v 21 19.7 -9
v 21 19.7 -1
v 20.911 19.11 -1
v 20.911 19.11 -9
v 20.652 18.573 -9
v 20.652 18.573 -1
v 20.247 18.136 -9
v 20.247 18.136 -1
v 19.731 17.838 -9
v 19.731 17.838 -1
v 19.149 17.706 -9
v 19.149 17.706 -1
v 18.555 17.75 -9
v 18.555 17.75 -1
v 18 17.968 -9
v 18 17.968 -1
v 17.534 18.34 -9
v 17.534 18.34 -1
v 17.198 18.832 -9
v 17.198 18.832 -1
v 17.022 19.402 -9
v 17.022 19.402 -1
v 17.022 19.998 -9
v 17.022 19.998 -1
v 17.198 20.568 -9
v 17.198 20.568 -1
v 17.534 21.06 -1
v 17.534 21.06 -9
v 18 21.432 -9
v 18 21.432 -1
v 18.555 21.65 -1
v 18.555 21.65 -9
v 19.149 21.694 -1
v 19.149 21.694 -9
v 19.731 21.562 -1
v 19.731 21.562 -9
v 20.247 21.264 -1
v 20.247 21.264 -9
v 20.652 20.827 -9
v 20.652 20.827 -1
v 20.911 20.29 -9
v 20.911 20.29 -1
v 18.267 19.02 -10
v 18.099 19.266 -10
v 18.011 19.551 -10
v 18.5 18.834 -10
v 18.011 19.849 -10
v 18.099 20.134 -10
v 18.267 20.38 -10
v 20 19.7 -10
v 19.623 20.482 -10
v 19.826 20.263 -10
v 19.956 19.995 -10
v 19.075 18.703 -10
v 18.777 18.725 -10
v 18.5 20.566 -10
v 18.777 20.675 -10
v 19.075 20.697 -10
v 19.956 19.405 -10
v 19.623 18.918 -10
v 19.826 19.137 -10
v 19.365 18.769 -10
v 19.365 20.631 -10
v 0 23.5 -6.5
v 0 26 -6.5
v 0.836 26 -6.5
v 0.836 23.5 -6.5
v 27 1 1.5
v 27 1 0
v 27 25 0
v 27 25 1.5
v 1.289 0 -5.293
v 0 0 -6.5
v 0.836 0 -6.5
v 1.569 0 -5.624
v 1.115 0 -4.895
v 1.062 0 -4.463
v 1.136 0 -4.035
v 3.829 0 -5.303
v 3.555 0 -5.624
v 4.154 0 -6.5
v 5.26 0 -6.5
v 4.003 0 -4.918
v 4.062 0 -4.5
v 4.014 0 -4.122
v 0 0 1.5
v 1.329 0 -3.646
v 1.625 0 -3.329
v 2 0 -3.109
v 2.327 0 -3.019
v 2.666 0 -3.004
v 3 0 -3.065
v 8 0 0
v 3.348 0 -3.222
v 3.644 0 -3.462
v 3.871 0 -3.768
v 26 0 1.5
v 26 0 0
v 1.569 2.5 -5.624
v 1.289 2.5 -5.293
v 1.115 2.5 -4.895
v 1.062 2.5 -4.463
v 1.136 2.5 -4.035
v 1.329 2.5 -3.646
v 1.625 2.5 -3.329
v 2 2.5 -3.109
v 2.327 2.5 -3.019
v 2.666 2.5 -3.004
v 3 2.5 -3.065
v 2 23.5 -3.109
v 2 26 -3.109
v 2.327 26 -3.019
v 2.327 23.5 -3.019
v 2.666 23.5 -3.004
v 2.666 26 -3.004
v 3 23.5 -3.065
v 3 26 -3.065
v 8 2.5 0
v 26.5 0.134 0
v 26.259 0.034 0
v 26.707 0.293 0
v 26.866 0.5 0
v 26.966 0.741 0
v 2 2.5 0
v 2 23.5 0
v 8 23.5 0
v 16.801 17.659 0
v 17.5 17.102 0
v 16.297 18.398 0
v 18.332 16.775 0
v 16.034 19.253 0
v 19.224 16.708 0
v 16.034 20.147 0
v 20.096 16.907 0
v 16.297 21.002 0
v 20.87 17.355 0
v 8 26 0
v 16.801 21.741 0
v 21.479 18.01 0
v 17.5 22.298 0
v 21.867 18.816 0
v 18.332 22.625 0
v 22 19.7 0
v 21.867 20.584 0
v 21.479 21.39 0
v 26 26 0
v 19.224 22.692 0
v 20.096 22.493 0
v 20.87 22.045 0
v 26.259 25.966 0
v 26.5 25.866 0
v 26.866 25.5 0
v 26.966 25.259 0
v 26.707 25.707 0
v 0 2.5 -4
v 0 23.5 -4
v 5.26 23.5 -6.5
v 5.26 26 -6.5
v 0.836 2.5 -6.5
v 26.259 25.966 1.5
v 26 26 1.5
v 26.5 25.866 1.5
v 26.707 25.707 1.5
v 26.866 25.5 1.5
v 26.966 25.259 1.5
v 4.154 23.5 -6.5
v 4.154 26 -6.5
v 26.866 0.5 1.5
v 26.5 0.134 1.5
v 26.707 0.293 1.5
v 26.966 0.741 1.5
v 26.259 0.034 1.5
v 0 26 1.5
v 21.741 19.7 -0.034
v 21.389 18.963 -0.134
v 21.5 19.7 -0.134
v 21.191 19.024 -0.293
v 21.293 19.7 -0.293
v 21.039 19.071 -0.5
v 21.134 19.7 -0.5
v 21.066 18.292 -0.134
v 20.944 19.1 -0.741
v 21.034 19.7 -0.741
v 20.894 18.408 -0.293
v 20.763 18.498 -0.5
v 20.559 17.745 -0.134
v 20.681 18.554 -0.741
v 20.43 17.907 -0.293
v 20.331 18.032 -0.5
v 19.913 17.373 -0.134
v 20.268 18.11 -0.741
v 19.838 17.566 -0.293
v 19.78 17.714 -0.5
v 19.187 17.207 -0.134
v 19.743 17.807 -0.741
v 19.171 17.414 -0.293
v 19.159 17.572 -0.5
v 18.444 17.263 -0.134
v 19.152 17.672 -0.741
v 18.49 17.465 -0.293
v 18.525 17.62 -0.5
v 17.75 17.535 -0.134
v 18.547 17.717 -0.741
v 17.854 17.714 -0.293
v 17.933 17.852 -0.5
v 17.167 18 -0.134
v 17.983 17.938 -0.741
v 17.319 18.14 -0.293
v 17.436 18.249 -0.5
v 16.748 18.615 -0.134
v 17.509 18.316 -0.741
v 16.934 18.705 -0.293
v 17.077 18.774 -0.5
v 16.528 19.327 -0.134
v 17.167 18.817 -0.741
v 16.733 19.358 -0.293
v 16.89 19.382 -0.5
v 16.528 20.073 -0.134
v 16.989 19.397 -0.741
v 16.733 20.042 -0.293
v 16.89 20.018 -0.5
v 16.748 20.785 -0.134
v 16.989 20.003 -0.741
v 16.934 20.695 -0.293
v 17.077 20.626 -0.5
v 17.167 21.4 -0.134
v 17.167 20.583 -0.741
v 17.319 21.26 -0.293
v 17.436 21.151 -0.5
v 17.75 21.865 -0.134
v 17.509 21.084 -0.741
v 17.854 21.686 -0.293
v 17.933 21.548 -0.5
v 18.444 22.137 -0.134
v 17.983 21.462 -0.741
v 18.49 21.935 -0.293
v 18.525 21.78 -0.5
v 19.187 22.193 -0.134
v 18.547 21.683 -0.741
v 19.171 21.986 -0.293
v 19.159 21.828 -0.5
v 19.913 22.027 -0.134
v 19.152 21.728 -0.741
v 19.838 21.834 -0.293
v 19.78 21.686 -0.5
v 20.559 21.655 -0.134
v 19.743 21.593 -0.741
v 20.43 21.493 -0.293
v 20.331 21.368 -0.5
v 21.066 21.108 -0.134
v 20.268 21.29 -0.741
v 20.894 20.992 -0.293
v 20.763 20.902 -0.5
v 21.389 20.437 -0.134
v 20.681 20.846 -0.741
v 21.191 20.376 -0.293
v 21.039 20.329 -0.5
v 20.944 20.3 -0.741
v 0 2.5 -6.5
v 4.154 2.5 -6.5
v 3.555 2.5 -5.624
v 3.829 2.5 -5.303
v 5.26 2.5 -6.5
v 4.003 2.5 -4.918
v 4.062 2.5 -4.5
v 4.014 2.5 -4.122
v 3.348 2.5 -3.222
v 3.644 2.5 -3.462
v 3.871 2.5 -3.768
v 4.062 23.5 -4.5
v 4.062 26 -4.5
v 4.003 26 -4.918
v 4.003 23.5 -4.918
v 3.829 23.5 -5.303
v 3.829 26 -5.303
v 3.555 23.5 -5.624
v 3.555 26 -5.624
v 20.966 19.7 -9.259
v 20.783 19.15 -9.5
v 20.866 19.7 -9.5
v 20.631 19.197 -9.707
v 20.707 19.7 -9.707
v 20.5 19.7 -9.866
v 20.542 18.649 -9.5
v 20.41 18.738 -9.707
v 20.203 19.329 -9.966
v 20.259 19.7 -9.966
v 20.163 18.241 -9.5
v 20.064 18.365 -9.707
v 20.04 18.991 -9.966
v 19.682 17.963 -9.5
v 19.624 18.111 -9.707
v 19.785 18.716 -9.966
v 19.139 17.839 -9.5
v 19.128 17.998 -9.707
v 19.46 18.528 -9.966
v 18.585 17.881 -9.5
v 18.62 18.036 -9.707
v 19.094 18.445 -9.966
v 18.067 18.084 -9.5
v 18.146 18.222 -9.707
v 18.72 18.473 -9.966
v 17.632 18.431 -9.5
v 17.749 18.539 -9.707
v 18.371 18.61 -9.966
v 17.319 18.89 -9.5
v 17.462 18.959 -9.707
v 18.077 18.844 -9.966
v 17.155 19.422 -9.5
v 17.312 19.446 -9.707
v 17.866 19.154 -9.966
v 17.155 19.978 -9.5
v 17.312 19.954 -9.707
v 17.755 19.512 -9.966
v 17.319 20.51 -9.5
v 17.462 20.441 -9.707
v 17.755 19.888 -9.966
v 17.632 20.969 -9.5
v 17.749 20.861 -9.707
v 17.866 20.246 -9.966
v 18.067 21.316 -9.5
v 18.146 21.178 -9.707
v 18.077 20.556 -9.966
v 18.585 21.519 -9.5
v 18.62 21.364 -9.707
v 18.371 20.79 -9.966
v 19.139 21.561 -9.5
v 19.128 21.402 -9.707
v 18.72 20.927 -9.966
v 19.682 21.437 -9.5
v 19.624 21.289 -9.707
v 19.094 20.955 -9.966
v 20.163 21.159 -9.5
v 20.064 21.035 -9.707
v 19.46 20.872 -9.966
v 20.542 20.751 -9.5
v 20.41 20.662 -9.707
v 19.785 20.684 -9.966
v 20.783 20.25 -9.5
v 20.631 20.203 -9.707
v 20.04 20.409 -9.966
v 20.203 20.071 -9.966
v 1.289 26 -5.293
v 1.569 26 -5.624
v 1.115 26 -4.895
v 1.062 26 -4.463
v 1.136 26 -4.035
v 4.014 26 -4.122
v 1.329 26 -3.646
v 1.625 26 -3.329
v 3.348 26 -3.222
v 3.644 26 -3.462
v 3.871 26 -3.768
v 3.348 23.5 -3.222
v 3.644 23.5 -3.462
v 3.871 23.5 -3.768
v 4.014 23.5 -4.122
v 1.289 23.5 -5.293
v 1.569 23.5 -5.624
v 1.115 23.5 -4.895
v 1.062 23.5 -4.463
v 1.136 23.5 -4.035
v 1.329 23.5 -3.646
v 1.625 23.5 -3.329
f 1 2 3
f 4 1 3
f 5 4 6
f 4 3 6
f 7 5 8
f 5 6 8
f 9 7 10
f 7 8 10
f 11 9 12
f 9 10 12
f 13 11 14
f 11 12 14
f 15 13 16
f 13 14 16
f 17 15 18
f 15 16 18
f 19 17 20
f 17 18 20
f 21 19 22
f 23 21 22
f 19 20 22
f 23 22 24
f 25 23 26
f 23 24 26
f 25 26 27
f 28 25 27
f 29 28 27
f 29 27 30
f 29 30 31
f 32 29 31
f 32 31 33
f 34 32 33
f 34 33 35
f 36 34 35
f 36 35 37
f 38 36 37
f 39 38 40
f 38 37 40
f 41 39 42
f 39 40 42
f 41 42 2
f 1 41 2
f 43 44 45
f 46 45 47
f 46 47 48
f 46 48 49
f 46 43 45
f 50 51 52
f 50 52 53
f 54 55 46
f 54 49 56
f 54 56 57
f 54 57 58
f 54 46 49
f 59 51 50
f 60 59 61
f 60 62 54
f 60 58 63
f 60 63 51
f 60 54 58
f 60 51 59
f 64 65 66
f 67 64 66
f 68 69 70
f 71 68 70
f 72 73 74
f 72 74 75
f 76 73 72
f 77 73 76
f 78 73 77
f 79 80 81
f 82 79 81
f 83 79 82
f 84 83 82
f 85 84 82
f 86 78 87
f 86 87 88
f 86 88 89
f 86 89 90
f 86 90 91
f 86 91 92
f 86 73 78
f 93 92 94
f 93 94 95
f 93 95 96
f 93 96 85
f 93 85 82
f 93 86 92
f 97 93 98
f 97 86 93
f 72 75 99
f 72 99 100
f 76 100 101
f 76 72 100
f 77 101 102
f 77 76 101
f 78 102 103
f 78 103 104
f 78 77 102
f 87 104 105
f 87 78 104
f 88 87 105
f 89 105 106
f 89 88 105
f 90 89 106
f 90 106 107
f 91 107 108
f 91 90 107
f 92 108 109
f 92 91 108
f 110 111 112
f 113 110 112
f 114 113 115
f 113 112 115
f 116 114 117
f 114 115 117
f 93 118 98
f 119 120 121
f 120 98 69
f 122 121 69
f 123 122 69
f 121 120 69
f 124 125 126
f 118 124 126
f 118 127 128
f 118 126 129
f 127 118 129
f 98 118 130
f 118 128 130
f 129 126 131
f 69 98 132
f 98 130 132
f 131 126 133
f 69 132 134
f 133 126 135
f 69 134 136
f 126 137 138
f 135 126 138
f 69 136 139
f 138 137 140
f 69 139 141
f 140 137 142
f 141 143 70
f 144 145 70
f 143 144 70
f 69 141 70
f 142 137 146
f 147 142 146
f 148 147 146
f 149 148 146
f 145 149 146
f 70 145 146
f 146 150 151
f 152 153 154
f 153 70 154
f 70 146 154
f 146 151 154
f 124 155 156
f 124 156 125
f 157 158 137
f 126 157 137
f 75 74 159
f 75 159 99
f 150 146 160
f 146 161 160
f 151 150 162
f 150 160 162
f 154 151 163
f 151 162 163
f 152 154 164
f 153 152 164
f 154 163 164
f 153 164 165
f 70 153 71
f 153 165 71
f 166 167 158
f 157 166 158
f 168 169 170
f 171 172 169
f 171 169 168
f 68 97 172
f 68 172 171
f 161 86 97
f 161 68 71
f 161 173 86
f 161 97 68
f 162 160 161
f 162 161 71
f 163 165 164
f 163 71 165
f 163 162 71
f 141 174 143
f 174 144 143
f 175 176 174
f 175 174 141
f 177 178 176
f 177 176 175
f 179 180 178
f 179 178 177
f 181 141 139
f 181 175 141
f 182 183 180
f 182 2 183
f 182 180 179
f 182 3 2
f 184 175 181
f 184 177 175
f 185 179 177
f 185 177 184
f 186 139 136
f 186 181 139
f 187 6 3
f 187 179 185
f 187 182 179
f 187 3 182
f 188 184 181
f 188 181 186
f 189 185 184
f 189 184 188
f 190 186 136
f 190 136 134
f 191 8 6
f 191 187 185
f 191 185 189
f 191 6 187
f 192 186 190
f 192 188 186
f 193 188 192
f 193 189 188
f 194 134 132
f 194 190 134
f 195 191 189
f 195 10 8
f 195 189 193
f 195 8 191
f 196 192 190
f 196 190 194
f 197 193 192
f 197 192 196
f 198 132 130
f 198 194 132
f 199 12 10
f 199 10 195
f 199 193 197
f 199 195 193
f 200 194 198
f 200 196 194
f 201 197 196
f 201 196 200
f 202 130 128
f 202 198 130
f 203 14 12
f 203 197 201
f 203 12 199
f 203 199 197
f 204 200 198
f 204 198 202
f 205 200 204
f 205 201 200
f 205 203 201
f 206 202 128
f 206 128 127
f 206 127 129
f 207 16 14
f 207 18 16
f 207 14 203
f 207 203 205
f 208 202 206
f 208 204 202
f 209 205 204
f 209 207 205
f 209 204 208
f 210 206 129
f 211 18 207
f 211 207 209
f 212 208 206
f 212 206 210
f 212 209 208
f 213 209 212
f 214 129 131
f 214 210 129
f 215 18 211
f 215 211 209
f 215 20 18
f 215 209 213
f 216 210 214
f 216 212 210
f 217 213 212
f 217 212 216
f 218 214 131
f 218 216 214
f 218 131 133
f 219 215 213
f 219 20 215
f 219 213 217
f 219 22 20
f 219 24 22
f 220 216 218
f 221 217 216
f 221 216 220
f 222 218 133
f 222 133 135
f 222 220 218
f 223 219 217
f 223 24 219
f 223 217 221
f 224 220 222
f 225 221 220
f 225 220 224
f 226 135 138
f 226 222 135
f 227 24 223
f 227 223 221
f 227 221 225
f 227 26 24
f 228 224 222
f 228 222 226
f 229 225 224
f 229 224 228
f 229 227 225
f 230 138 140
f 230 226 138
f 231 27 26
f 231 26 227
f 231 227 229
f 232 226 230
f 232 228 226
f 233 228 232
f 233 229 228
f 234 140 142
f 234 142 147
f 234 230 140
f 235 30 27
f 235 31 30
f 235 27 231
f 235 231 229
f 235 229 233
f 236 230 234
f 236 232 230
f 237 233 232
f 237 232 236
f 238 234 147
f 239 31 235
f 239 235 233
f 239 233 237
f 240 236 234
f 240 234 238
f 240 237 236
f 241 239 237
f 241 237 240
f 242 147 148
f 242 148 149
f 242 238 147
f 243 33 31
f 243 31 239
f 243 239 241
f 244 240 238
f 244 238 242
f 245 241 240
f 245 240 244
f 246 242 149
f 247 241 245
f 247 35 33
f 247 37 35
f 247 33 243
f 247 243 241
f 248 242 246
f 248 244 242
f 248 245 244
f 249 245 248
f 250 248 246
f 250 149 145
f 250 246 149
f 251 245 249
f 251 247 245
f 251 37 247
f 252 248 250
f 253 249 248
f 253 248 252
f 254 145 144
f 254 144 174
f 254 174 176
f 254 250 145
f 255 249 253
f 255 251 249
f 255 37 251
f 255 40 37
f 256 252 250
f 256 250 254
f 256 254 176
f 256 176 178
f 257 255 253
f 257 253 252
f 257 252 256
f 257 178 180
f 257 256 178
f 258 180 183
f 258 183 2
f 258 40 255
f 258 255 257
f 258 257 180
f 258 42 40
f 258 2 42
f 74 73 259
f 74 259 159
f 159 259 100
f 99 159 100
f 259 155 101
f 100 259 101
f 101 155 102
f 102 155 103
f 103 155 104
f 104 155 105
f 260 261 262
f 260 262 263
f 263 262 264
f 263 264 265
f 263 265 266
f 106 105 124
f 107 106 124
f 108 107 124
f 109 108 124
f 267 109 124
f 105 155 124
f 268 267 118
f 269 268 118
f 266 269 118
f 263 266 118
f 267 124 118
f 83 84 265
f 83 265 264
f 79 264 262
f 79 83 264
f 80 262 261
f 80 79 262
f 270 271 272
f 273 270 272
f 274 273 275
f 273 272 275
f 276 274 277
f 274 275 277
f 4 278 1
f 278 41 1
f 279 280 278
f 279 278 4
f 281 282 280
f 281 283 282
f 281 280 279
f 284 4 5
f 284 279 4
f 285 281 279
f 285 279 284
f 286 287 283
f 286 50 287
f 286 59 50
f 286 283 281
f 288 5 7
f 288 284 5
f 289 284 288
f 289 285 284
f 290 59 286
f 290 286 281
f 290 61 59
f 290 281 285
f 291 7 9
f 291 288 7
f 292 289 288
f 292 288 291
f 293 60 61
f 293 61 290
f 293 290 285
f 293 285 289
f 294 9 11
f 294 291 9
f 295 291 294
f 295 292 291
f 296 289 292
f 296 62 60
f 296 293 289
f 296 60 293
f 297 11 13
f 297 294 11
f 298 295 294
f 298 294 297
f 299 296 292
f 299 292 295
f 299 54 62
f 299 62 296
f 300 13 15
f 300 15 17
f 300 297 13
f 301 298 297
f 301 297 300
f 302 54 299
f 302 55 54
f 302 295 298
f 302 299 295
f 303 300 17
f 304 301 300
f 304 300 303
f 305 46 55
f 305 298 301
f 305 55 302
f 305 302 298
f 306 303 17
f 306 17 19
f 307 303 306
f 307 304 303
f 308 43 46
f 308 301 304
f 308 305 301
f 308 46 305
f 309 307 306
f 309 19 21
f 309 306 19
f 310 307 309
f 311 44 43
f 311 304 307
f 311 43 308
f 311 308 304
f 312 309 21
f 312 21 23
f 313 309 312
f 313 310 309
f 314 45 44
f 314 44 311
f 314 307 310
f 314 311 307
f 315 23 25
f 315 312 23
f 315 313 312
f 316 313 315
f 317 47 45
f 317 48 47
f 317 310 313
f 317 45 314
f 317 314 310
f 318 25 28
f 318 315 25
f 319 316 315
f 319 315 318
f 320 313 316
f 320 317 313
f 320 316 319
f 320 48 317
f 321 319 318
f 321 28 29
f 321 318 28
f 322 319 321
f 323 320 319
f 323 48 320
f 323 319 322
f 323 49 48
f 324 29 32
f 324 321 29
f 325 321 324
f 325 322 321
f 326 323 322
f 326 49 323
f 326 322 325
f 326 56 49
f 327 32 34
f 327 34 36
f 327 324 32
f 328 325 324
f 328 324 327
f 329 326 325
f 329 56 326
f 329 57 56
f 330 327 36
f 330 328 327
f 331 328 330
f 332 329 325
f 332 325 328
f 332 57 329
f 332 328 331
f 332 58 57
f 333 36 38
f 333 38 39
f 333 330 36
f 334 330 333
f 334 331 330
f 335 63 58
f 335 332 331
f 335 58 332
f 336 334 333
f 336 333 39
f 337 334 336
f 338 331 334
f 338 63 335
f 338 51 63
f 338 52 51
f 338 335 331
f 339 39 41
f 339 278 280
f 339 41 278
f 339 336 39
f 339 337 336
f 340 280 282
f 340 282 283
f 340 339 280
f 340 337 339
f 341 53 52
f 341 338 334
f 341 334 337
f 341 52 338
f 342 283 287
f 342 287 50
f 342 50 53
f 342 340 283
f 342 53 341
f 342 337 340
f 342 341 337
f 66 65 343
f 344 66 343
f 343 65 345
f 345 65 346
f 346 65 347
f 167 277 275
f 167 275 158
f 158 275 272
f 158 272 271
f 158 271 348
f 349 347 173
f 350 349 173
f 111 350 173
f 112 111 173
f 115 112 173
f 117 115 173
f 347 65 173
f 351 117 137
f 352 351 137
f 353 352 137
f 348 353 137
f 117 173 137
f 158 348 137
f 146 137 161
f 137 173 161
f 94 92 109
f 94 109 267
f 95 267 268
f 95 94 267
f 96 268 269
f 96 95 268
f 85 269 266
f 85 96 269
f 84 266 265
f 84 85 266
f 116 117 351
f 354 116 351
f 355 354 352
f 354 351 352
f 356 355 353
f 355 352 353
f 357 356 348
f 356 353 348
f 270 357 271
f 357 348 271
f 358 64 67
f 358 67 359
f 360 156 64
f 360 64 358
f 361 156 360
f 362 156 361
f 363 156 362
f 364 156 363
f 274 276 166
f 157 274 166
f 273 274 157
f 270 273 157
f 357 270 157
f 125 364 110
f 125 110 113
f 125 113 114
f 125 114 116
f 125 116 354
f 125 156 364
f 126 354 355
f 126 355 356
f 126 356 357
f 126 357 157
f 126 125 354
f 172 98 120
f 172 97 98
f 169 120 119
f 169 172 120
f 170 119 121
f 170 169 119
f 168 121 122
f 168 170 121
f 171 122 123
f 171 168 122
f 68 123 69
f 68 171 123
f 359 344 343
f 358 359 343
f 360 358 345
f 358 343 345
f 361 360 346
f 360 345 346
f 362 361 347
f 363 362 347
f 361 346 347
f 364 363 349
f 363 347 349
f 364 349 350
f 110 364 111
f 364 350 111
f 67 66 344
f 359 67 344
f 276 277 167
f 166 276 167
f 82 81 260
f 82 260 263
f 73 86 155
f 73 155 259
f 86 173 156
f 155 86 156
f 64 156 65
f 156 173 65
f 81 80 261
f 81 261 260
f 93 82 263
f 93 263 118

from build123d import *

# Parameters (mm, degrees)
F0_W     = 27
F0_H     = 26
F1_DEPTH = 1.5
F3_DEPTH = 2.5
F5_DEPTH = 26
F7_R     = 2
F8_DEPTH = 10
F9_R     = 1
F10_R    = 1


# Not quite as in the source:
# - a pattern or mirror of a feature is missing from the dataset's text; its kind, count and spacing are read off the source's solid


with BuildPart() as f1:
    # F0 (on Top) → F1 (new body)
    with BuildSketch(Plane.XY):
        with Locations((13.5, 13)):
            Rectangle(F0_W, F0_H)
    extrude(amount=F1_DEPTH)

    # F2 (on Front) → F3 (join)
    with BuildSketch(Plane.XZ):
        with BuildLine():
            Line((2, 0), (0, 0))
            Line((0, 0), (0, -6.5))
            Line((0, -6.5), (0.8364939141, -6.5))
            Line((0.8364939141, -6.5), (1.5690374528, -5.6242691353))
            ThreePointArc((1.5690374528, -5.6242691353), (1.0835712802, -4.2466571982), (2, -3.1092696409))
            Line((2, -3.1092696409), (2, 0))
        make_face()
        with BuildLine():
            Line((8, 0), (3, 0))
            Line((3, 0), (3, -3.0653657134))
            ThreePointArc((3, -3.0653657134), (3.7676272431, -3.6075221422), (4.0620223023, -4.5))
            ThreePointArc((4.0620223023, -4.5), (3.9294061684, -5.1166533571), (3.5550071518, -5.6242691353))
            Line((3.5550071518, -5.6242691353), (4.1543185927, -6.5))
            Line((4.1543185927, -6.5), (5.2601844187, -6.5))
            Line((5.2601844187, -6.5), (8, 0))
        make_face()
        with BuildLine():
            Line((3, 0), (2, 0))
            Line((2, 0), (2, -3.1092696409))
            ThreePointArc((2, -3.1092696409), (2.4962297898, -3.0014435795), (3, -3.0653657134))
            Line((3, -3.0653657134), (3, 0))
        make_face()
    f3 = extrude(amount=-F3_DEPTH)

    # F3_copies: F3 across plane
    add(f3.mirror(Plane.ZX.offset(13)))

    # F4 (on Front) → F5 (join, through all)
    with BuildSketch(Plane.XZ):
        Polygon((2, 0), (0, 0), (0, -4), align=None)
    extrude(amount=-F5_DEPTH)

    # F7 (on face) → F8 (join)
    with BuildSketch(Plane(origin=(0, 0, 0), x_dir=(1, 0, 0), z_dir=(0, 0, -1))):
        with Locations((19, -19.7)):
            Circle(F7_R)
    extrude(amount=F8_DEPTH)

    # F9
    f9_edges = [f1.edges().sort_by_distance(p)[0] for p in [
        (17, 19.7, 0),
        (17, 19.7, -10),
    ]]
    fillet(f9_edges, radius=F9_R)

    # F10
    f10_edges = [f1.edges().sort_by_distance(p)[0] for p in [
        (27, 26, 0.75),
        (27, 0, 0.75),
    ]]
    fillet(f10_edges, radius=F10_R)


solid = f1.part
